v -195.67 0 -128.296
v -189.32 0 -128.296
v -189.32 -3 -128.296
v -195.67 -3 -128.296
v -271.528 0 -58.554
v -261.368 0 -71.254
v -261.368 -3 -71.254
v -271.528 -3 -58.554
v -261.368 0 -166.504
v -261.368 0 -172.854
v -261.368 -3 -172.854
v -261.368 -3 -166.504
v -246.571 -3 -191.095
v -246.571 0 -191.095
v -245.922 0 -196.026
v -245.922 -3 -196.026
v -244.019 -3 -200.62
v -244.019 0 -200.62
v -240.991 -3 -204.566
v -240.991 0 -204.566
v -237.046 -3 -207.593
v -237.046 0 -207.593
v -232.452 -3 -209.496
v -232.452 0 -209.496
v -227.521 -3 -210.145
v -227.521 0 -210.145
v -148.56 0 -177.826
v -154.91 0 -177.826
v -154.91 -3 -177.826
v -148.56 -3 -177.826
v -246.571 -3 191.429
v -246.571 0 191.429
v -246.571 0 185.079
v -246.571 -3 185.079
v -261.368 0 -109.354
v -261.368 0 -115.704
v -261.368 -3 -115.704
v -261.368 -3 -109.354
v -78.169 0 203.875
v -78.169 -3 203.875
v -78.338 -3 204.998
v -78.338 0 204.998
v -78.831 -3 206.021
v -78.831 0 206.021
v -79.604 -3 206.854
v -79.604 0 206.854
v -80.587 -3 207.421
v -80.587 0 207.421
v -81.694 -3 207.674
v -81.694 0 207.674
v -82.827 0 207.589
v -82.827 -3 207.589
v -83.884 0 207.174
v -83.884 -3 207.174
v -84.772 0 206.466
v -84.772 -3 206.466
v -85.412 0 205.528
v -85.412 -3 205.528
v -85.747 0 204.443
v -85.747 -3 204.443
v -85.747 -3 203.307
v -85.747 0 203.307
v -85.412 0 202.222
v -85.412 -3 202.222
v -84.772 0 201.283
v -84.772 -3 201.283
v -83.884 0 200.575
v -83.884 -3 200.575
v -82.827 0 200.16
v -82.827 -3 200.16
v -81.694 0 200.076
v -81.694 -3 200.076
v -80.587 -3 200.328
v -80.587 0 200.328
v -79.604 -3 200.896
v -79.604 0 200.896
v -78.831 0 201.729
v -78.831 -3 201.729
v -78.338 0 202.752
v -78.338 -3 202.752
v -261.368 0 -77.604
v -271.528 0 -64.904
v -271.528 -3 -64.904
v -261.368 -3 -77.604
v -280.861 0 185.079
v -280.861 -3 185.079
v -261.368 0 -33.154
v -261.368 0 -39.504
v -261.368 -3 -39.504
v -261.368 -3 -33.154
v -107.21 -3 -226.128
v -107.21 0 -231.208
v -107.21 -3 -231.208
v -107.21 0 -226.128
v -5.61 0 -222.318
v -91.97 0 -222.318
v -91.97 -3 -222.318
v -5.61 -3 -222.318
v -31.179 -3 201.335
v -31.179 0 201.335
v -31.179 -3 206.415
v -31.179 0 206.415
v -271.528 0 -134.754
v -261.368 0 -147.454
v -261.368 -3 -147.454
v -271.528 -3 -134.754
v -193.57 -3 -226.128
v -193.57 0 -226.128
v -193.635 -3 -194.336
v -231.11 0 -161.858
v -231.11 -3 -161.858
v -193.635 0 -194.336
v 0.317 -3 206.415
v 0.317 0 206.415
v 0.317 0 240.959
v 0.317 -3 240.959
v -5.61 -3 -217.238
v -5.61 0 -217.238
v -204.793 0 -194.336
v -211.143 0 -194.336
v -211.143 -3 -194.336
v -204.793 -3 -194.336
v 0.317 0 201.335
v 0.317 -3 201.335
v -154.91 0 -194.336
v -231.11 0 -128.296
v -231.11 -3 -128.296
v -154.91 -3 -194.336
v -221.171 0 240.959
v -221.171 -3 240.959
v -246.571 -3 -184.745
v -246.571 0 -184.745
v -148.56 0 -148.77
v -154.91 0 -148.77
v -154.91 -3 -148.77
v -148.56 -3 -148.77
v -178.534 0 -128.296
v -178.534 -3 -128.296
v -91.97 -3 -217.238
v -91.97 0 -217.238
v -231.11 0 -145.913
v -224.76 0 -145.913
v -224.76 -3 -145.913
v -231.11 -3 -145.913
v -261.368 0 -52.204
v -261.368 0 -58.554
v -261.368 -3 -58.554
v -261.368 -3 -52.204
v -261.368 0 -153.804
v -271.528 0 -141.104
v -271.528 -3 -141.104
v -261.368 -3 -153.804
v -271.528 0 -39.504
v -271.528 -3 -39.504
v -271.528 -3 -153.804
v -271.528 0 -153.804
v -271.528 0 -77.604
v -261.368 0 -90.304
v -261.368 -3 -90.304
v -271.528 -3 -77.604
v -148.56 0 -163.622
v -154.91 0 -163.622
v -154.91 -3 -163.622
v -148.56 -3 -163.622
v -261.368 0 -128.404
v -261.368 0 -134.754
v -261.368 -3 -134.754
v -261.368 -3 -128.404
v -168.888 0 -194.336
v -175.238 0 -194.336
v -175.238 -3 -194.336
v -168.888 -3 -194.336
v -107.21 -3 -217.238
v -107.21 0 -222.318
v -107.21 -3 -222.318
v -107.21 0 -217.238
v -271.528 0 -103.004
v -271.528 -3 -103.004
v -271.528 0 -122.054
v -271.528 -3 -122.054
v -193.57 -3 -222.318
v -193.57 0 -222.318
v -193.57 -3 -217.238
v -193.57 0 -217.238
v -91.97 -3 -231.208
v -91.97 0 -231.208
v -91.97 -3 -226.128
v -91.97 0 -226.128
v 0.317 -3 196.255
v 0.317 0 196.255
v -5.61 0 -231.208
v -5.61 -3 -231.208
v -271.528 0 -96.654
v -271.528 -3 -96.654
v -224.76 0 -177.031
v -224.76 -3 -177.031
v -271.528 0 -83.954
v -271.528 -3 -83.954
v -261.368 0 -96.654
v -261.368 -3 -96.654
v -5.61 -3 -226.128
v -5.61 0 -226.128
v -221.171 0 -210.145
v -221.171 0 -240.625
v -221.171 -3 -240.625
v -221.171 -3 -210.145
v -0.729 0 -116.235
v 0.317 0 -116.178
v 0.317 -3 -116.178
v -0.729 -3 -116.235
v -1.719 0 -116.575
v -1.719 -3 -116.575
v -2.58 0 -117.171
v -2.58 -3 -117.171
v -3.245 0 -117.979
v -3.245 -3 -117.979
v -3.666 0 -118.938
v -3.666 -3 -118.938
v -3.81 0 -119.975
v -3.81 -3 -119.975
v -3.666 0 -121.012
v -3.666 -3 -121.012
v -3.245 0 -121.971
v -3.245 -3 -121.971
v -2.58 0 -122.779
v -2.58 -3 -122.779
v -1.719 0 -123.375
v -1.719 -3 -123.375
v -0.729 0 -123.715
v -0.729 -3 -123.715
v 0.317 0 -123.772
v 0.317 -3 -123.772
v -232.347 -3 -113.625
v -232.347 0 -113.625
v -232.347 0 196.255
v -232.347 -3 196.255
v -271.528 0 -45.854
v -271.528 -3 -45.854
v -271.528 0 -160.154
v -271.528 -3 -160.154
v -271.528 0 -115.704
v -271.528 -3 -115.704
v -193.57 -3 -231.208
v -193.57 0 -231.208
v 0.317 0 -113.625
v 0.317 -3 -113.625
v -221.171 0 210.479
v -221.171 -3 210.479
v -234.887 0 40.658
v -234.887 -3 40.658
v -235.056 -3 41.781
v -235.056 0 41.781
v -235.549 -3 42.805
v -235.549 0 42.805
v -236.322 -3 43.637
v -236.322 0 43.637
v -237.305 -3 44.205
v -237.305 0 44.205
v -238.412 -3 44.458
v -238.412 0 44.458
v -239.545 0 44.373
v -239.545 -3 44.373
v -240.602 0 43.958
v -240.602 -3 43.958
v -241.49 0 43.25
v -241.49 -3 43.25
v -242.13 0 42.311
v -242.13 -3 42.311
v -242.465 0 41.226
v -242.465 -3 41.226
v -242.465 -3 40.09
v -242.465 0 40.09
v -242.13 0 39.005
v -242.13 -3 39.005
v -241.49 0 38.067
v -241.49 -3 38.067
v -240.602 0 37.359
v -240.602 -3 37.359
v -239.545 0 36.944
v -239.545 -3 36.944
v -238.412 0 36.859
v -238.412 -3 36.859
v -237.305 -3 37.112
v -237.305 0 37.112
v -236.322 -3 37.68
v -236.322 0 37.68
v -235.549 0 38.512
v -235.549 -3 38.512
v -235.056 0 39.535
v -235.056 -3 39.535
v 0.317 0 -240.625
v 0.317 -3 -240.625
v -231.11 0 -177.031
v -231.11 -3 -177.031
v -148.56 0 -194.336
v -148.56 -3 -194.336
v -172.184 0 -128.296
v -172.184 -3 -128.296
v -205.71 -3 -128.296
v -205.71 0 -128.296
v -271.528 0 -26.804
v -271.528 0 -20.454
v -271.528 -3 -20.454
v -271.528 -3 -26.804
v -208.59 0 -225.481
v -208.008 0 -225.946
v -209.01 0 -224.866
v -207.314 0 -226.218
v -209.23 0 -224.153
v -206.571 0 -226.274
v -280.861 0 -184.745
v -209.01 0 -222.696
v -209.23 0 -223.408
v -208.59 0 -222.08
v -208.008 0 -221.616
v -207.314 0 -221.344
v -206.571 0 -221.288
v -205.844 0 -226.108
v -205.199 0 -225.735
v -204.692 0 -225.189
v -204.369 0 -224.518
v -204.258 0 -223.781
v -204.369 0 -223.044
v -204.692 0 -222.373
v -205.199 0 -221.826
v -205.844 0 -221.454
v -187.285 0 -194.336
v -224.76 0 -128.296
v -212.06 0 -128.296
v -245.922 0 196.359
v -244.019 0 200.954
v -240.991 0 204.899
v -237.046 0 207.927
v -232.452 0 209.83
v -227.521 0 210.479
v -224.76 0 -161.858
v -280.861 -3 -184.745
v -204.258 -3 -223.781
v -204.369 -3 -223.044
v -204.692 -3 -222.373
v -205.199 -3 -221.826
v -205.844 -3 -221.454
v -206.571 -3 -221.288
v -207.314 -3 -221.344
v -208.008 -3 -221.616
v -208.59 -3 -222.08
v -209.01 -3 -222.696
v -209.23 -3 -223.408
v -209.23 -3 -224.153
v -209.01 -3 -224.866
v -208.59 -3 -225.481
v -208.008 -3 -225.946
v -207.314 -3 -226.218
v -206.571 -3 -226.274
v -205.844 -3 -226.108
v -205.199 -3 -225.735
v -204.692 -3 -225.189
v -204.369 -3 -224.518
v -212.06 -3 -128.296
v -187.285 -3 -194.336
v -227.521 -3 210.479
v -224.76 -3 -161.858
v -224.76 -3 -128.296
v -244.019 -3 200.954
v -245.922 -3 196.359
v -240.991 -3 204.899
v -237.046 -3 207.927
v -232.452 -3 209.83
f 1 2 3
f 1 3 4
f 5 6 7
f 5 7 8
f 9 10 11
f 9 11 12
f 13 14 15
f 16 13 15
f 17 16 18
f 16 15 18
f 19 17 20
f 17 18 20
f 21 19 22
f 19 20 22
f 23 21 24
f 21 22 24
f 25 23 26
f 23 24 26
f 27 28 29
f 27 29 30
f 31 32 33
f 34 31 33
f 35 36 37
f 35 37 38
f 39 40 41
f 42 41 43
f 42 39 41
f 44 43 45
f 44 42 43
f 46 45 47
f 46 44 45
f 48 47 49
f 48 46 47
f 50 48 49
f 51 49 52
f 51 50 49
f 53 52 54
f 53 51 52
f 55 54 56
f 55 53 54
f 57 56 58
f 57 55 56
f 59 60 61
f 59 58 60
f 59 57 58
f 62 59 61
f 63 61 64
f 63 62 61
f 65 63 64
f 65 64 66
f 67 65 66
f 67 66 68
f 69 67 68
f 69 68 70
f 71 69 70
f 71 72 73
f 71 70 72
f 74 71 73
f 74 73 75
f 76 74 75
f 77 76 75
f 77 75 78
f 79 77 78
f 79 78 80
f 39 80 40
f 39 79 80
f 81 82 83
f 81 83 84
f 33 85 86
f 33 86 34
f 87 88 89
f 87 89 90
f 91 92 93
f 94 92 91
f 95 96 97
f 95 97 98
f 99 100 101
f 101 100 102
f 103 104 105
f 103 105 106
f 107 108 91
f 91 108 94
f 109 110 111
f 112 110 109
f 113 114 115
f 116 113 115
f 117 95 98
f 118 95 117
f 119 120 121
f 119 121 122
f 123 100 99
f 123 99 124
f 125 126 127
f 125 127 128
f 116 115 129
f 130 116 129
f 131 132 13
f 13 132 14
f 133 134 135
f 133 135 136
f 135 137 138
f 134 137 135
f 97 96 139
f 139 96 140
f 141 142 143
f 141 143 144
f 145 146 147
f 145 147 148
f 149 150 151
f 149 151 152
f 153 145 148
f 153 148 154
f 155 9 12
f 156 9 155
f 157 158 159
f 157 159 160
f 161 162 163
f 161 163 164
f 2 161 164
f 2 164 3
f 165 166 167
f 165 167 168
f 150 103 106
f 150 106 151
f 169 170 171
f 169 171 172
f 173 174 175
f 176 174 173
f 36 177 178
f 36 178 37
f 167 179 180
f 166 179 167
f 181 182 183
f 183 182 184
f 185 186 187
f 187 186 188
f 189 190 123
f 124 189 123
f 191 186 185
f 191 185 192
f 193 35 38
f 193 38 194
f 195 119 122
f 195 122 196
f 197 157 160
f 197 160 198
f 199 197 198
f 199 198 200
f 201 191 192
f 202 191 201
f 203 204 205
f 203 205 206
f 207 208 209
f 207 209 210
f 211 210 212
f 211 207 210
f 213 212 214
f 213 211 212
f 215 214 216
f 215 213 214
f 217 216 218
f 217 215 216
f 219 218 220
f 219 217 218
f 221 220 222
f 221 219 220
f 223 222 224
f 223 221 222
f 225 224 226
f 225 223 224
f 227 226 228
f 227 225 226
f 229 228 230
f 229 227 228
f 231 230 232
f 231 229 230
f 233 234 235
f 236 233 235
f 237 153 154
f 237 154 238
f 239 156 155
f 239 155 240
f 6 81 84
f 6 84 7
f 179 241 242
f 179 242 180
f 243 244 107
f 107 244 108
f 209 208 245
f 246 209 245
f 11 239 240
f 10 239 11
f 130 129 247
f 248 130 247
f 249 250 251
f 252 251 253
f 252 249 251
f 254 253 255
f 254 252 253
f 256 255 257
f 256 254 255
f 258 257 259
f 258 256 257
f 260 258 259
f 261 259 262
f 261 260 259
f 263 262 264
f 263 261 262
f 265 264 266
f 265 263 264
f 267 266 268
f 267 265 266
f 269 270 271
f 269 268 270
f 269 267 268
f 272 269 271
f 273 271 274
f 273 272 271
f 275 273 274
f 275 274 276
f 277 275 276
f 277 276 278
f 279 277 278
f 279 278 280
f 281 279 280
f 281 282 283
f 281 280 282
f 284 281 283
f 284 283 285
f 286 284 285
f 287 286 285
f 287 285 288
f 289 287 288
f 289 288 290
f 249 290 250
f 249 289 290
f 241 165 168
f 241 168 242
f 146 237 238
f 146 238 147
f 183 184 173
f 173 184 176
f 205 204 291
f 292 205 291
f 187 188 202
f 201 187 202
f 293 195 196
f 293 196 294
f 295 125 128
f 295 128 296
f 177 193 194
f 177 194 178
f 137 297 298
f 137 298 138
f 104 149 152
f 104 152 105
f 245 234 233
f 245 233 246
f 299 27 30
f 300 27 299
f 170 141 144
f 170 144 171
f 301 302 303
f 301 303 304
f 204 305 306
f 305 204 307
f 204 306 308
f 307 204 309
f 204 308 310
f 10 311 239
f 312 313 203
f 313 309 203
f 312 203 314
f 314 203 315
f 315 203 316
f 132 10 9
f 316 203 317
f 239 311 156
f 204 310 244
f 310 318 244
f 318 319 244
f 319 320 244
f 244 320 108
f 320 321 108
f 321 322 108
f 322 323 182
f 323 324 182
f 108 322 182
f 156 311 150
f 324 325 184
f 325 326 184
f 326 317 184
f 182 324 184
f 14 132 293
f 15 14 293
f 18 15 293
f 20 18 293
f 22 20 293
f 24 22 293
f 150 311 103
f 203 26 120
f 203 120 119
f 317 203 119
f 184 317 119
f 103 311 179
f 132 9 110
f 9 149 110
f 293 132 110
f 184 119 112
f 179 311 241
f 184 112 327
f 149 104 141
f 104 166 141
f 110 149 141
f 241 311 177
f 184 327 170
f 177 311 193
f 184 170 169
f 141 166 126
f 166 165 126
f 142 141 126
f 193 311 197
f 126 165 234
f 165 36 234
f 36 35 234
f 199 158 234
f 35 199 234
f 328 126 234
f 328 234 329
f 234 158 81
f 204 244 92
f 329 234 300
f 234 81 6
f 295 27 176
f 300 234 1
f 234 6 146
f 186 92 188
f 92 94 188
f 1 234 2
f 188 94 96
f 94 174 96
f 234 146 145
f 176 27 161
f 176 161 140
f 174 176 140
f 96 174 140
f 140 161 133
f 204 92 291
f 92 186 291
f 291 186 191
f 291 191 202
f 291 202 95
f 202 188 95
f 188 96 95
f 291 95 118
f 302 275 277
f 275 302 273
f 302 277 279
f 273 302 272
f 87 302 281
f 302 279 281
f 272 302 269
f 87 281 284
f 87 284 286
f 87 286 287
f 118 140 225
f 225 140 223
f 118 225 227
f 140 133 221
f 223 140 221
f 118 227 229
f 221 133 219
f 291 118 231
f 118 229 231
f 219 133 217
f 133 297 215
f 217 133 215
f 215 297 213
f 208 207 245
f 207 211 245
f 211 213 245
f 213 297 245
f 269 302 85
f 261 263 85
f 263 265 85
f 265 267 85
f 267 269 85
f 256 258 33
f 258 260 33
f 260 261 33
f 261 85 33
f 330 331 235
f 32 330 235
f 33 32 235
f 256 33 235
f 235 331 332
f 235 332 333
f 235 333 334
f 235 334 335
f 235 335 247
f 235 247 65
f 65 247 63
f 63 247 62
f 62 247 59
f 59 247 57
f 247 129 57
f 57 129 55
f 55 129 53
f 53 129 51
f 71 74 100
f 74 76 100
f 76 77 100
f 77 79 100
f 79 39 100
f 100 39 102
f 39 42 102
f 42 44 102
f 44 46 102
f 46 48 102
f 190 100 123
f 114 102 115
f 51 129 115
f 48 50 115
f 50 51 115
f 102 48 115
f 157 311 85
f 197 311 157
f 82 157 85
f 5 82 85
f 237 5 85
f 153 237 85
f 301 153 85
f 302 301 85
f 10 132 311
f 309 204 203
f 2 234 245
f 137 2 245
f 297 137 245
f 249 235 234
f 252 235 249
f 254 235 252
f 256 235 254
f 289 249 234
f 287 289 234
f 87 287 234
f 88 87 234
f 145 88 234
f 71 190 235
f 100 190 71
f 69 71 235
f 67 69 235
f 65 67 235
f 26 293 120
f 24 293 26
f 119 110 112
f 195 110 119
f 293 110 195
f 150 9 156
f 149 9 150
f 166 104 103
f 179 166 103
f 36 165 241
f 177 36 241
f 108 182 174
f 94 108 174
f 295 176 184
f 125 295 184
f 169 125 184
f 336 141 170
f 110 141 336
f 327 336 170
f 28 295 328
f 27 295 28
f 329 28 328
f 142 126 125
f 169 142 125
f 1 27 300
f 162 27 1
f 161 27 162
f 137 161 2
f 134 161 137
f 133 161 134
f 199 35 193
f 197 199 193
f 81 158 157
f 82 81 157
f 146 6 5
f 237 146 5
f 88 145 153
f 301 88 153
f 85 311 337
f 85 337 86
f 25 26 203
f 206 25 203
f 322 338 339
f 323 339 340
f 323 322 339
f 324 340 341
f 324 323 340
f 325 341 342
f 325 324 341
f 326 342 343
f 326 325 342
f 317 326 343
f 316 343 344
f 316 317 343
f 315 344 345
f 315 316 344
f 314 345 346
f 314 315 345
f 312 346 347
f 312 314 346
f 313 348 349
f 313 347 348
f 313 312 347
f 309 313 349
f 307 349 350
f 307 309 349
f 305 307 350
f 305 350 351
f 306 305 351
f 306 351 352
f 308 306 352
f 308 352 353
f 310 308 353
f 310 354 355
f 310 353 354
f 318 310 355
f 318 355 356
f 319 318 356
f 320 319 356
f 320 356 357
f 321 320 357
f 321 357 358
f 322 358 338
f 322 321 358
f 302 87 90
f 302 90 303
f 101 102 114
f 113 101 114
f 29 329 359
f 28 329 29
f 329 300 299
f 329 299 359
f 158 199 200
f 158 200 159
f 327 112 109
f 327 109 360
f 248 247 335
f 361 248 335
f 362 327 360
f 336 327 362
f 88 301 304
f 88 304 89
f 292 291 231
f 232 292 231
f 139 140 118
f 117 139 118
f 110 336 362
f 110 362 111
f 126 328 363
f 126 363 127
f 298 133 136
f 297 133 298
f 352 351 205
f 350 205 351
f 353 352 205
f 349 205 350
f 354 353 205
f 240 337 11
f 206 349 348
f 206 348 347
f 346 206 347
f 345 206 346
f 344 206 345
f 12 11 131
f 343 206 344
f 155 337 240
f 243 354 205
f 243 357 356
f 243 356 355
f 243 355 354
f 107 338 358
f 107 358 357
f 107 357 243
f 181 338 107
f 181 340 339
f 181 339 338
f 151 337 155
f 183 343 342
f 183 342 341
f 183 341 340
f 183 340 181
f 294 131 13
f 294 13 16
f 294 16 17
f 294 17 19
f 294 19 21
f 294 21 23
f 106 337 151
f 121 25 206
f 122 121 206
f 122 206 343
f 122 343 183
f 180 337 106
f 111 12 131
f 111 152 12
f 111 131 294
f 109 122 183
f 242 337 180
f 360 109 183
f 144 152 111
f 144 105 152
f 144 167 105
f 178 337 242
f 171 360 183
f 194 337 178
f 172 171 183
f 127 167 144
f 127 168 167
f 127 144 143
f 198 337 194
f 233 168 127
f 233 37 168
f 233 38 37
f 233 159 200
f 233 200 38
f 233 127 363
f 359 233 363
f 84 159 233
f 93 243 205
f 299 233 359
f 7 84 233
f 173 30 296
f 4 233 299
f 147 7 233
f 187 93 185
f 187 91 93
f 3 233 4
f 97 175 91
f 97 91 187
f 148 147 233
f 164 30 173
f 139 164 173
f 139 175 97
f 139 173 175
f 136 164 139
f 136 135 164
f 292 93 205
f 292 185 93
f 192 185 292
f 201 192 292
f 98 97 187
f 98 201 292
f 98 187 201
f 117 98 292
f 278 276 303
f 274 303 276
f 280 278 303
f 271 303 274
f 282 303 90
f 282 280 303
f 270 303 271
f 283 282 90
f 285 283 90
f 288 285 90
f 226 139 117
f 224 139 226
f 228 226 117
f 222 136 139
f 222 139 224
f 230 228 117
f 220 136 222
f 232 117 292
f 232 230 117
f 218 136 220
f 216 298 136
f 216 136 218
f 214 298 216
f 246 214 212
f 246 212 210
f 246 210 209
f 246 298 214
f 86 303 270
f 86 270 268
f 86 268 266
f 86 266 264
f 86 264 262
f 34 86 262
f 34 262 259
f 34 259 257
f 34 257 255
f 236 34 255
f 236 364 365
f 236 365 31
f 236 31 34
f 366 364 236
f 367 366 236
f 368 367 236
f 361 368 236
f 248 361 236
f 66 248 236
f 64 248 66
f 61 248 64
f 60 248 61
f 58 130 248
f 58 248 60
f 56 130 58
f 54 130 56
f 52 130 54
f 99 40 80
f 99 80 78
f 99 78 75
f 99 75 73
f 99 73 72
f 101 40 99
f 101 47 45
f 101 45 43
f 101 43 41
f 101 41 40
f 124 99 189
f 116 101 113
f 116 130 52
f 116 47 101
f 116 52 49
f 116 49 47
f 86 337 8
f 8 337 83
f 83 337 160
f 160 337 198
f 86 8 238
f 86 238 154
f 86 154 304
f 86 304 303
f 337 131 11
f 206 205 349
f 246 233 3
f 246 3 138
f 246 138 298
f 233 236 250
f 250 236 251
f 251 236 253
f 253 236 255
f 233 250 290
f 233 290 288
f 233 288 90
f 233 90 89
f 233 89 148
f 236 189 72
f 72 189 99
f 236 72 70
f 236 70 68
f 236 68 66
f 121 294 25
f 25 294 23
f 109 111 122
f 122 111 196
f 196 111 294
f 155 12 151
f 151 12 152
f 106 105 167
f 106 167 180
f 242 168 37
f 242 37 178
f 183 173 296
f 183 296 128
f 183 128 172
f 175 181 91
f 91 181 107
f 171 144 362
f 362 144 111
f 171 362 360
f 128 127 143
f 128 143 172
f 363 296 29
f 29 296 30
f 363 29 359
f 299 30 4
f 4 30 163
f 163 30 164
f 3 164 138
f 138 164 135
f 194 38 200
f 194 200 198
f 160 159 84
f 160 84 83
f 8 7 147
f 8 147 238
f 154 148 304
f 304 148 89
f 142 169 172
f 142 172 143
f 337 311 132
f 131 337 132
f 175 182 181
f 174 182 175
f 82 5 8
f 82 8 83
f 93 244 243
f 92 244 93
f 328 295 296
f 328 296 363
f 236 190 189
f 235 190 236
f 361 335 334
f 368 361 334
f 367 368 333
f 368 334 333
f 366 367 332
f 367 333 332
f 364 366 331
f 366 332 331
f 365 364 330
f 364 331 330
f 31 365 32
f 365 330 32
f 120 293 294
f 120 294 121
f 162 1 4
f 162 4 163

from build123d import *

# Parameters (mm, degrees)
F0_W     = 34.29
F0_H     = 369.824
F0_W_2   = 221.488
F0_H_2   = 30.48
F1_DEPTH = 3
F2_W     = 212.566798
F2_H     = 309.88
F2_W_2   = 19.780282
F2_W_3   = 22.356551
F2_W_4   = 86.36
F2_H_2   = 5.08
F2_R     = 2.5
F2_R_2   = 3.81
F2_W_5   = 57.019912
F3_DEPTH = 25.4
F5_DEPTH = 25.4


with BuildPart() as f1:
    # F0 (on Front) → F1 (new body)
    with BuildSketch(Plane.XZ):
        with Locations((-263.71608, 0.16686)):
            Rectangle(F0_W, F0_H)
        with BuildLine():
            Line((-246.57108, 191.42886), (-246.57108, 185.07886))
            Line((-246.57108, 185.07886), (-246.57108, -184.74514))
            Line((-246.57108, -184.74514), (-246.57108, -191.09514))
            ThreePointArc((-246.57108, -191.09514), (-240.991464, -204.565524), (-227.52108, -210.14514))
            Line((-227.52108, -210.14514), (-221.17108, -210.14514))
            Line((-221.17108, -210.14514), (0.31692, -210.14514))
            Line((0.31692, -210.14514), (0.31692, 210.47886))
            Line((0.31692, 210.47886), (-202.12108, 210.47886))
            Line((-202.12108, 210.47886), (-221.17108, 210.47886))
            Line((-221.17108, 210.47886), (-227.52108, 210.47886))
            ThreePointArc((-227.52108, 210.47886), (-240.991464, 204.899244), (-246.57108, 191.42886))
        make_face()
        Polygon((-221.17108, 240.95886), (-221.17108, 210.47886), (-202.12108, 210.47886), (0.31692, 210.47886), (0.31692, 240.95886), align=None)
        with Locations((-110.42708, -225.38514)):
            Rectangle(F0_W_2, F0_H_2)
    extrude(amount=F1_DEPTH)

    # F2 (on Front) → F3 (cut)
    with BuildSketch(Plane.XZ):
        with Locations((-126.063681, 41.31486)):
            Rectangle(F2_W, F2_H)
        with Locations((-9.890141, 41.31486)):
            Rectangle(F2_W_2, F2_H)
        with Locations((11.178275, 41.31486)):
            Rectangle(F2_W_3, F2_H)
        Polygon((-261.367738, -166.503845), (-271.527738, -153.803845), (-271.527738, -160.153845), (-261.367738, -172.853845), align=None)
        Polygon((-271.527738, -134.753845), (-271.527738, -141.103845), (-261.367738, -153.803845), (-261.367738, -147.453845), align=None)
        Polygon((-271.527738, -122.053845), (-261.367738, -134.753845), (-261.367738, -128.403845), (-271.527738, -115.703845), align=None)
        Polygon((-271.527738, -103.003845), (-261.367738, -115.703845), (-261.367738, -109.353845), (-271.527738, -96.653845), align=None)
        Polygon((-271.527738, -83.953845), (-261.367738, -96.653845), (-261.367738, -90.303845), (-271.527738, -77.603845), align=None)
        Polygon((-271.527738, -64.903845), (-261.367738, -77.603845), (-261.367738, -71.253845), (-271.527738, -58.553845), align=None)
        Polygon((-271.527738, -45.853845), (-261.367738, -58.553845), (-261.367738, -52.203845), (-271.527738, -39.503845), align=None)
        Polygon((-271.527738, -26.803845), (-261.367738, -39.503845), (-261.367738, -33.153845), (-271.527738, -20.453845), align=None)
        with Locations((-150.390271, -228.668471)):
            Rectangle(F2_W_4, F2_H_2)
        with Locations((-150.390271, -219.778471)):
            Rectangle(F2_W_4, F2_H_2)
        with Locations((-48.790271, -219.778471)):
            Rectangle(F2_W_4, F2_H_2)
        with Locations((-48.790271, -228.668471)):
            Rectangle(F2_W_4, F2_H_2)
        with Locations((-206.757738, -223.780845)):
            Circle(F2_R)
        with Locations((-81.97908, 203.87486)):
            Circle(F2_R_2)
        with Locations((-238.69708, 40.658346)):
            Circle(F2_R_2)
        with Locations((0, -119.97514)):
            Circle(F2_R_2)
        with Locations((-2.669124, 203.87486)):
            Rectangle(F2_W_5, F2_H_2)
    extrude(amount=F3_DEPTH, mode=Mode.SUBTRACT)

    # F4 (on Front) → F5 (cut)
    with BuildSketch(Plane.XZ):
        Polygon((-224.760328, -128.296434), (-231.110328, -128.296434), (-154.910328, -194.336434), (-148.560328, -194.336434), align=None)
        Polygon((-205.710328, -128.296434), (-212.060328, -128.296434), (-154.910328, -177.826434), (-148.560328, -177.826434), align=None)
        Polygon((-224.760328, -145.913435), (-231.110328, -145.913435), (-175.237637, -194.336434), (-168.887637, -194.336434), align=None)
        Polygon((-224.760328, -161.858131), (-231.110328, -161.858131), (-193.635364, -194.336434), (-187.285364, -194.336434), align=None)
        Polygon((-224.760328, -177.031307), (-231.110328, -177.031307), (-211.142873, -194.336434), (-204.792873, -194.336434), align=None)
        Polygon((-154.910328, -163.62169), (-148.560328, -163.62169), (-189.320239, -128.296434), (-195.670239, -128.296434), align=None)
        Polygon((-154.910328, -148.76998), (-148.560328, -148.76998), (-172.183651, -128.296434), (-178.533651, -128.296434), align=None)
    extrude(amount=F5_DEPTH, mode=Mode.SUBTRACT)


solid = f1.part
